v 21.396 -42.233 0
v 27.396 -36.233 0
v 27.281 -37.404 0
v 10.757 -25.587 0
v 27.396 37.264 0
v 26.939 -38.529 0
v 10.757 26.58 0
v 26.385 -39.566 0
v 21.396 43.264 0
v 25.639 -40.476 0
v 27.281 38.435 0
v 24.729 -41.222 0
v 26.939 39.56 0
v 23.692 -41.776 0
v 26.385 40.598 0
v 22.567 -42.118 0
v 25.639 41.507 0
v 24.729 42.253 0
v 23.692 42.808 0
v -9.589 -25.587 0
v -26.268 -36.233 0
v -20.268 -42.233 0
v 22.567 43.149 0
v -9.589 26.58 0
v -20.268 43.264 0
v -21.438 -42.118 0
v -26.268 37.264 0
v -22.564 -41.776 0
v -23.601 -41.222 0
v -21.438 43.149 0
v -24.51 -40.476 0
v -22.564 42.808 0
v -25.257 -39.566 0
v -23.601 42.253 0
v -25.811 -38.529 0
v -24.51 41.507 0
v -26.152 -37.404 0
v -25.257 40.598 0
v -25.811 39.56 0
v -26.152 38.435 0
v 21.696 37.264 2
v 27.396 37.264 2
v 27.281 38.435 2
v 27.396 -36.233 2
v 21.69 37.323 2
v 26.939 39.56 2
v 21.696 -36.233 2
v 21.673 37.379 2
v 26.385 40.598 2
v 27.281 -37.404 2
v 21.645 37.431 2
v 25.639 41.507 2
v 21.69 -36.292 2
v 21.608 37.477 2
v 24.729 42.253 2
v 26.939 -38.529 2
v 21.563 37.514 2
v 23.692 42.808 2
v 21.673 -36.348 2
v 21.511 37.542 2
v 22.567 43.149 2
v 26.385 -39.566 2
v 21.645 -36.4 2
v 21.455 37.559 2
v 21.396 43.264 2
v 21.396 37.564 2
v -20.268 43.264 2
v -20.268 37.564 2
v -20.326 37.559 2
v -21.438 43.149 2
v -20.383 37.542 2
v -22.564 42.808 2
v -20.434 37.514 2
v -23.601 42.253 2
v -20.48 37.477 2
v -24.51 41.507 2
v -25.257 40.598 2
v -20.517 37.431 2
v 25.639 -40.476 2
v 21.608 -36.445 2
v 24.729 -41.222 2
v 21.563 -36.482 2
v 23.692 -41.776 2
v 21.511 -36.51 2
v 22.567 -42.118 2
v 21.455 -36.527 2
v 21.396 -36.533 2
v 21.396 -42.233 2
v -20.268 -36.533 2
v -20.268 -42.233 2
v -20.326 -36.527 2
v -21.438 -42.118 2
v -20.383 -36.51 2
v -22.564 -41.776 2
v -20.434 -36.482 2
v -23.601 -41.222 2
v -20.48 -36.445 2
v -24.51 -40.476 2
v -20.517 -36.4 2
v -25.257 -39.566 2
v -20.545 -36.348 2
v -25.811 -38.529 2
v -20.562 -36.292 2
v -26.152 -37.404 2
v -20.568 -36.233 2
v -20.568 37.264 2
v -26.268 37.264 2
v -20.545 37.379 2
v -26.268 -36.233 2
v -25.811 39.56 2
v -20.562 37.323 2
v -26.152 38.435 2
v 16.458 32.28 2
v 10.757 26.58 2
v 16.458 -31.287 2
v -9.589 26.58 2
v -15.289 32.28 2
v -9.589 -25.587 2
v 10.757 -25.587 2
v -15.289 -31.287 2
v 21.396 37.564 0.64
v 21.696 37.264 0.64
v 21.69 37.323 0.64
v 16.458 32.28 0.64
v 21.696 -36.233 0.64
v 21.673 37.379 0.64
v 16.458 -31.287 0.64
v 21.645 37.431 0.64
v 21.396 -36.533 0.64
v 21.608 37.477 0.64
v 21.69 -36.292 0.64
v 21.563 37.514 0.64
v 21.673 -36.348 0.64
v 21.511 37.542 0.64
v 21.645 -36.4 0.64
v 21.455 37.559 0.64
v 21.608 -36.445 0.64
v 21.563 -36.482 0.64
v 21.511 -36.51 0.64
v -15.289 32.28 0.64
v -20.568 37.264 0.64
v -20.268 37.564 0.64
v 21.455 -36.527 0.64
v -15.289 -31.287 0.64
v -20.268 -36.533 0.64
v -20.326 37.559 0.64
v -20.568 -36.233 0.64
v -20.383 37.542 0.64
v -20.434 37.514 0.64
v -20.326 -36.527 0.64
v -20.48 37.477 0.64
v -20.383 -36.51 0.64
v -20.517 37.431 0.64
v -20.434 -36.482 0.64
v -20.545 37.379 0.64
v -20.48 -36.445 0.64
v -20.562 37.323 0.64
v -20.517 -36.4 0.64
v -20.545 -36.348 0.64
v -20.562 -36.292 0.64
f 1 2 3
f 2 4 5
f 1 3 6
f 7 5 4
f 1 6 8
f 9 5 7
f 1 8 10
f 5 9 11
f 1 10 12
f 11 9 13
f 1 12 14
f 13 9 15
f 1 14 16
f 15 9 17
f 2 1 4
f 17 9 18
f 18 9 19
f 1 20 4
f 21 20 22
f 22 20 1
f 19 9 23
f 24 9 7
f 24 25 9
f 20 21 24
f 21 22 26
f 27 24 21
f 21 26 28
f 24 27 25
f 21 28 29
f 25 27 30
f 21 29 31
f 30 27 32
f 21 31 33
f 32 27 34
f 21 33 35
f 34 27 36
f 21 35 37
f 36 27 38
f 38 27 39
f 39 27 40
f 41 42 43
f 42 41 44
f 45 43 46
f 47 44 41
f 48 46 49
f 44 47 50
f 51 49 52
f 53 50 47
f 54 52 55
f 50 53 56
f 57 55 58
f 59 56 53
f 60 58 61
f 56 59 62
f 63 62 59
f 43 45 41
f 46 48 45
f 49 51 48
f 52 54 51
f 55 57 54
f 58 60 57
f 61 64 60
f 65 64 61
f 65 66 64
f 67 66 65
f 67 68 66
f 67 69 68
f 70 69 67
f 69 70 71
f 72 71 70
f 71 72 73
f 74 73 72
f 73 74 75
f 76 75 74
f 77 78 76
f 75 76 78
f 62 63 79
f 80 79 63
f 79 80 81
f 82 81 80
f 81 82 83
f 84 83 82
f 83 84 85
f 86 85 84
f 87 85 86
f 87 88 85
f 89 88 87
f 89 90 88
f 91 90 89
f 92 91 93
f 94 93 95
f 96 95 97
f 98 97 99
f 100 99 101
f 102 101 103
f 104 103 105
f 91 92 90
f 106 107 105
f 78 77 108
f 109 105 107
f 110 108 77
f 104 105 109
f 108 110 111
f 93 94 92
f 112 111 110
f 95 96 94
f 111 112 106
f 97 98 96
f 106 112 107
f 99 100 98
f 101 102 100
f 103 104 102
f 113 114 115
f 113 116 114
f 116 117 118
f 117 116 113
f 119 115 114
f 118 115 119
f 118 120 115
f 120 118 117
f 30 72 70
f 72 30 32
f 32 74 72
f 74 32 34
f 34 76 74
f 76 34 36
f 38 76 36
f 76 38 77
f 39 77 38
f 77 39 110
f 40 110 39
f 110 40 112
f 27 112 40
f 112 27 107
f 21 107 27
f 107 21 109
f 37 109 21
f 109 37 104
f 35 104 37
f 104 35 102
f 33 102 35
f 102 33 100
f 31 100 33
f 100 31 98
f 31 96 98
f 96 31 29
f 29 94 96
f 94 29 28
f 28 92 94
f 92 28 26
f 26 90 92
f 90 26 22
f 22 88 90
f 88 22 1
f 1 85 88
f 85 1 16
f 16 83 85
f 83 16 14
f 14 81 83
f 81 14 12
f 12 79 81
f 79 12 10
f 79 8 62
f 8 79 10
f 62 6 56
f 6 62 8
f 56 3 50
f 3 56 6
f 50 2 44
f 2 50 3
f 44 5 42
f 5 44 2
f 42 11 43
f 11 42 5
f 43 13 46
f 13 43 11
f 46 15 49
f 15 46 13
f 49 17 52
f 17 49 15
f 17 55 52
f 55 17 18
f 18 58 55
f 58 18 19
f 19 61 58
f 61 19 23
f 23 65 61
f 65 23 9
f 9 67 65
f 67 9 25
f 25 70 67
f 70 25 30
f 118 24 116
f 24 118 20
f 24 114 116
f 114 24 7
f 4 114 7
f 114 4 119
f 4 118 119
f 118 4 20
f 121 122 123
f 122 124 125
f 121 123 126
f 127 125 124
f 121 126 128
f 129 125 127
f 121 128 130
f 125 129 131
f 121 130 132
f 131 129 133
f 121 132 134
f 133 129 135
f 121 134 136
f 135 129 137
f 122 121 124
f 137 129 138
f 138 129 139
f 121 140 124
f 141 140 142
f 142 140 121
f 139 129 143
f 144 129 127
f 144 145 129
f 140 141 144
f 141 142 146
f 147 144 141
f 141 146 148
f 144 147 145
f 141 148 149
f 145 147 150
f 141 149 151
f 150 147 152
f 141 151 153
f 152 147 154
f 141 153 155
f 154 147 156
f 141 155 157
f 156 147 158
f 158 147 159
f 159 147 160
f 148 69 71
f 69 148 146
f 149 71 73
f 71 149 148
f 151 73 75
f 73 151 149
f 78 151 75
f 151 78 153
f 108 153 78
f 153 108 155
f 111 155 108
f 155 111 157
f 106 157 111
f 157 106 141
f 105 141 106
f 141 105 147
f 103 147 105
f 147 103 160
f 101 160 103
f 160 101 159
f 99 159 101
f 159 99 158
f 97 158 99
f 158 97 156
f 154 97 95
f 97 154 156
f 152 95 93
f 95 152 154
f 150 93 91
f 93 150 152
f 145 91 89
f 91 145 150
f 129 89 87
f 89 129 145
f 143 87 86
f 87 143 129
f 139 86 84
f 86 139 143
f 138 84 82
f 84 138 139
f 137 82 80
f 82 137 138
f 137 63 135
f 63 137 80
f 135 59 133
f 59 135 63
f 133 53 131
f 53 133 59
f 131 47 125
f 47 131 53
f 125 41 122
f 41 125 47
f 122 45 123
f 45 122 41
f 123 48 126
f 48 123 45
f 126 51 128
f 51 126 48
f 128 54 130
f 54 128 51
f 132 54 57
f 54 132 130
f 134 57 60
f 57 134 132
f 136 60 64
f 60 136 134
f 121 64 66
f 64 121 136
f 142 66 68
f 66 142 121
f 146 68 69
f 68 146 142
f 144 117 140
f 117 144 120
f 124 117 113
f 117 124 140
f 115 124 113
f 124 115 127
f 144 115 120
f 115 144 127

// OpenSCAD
GLOBAL_SCALE=[6,6,1];

module A_Character(c,h,SCALE=GLOBAL_SCALE) {
  scale(SCALE)
  linear_extrude(height=h){
    text(c, font="经典繁方篆", valign="center", halign="center");
  }
}

module B_CharacterCutOut(c,h,SCALE=GLOBAL_SCALE) {
  scale(SCALE)
  linear_extrude(height=h){
    minkowski() {
      text(c, font="经典繁方篆", valign="center", halign="center");
      circle(0.05,$fn=32);
    }
  }  
}

module C_CharacterOutline(c,h,SCALE=GLOBAL_SCALE) {
  scale(SCALE)
  linear_extrude(height=h){
    minkowski() {
      text(c, font="经典繁方篆", valign="center", halign="center");
      circle(1,$fn=32);
    }
  }  
}

// 思成 思为
  
module Z_CharacterSet(c,isOutline=0) {  
  if(isOutline==1) {      
    difference() {
      C_CharacterOutline(c,2);
      translate([0,0,0.32*2])
        B_CharacterCutOut(c,5);
    }
  } else {
    A_Character(c,3);    
  }
}

// 睡 - bedroom
// 洗 - bathroom
// 思 - study
// 吃 - kitchen
// 是 - living room

Z_CharacterSet("印",1);
